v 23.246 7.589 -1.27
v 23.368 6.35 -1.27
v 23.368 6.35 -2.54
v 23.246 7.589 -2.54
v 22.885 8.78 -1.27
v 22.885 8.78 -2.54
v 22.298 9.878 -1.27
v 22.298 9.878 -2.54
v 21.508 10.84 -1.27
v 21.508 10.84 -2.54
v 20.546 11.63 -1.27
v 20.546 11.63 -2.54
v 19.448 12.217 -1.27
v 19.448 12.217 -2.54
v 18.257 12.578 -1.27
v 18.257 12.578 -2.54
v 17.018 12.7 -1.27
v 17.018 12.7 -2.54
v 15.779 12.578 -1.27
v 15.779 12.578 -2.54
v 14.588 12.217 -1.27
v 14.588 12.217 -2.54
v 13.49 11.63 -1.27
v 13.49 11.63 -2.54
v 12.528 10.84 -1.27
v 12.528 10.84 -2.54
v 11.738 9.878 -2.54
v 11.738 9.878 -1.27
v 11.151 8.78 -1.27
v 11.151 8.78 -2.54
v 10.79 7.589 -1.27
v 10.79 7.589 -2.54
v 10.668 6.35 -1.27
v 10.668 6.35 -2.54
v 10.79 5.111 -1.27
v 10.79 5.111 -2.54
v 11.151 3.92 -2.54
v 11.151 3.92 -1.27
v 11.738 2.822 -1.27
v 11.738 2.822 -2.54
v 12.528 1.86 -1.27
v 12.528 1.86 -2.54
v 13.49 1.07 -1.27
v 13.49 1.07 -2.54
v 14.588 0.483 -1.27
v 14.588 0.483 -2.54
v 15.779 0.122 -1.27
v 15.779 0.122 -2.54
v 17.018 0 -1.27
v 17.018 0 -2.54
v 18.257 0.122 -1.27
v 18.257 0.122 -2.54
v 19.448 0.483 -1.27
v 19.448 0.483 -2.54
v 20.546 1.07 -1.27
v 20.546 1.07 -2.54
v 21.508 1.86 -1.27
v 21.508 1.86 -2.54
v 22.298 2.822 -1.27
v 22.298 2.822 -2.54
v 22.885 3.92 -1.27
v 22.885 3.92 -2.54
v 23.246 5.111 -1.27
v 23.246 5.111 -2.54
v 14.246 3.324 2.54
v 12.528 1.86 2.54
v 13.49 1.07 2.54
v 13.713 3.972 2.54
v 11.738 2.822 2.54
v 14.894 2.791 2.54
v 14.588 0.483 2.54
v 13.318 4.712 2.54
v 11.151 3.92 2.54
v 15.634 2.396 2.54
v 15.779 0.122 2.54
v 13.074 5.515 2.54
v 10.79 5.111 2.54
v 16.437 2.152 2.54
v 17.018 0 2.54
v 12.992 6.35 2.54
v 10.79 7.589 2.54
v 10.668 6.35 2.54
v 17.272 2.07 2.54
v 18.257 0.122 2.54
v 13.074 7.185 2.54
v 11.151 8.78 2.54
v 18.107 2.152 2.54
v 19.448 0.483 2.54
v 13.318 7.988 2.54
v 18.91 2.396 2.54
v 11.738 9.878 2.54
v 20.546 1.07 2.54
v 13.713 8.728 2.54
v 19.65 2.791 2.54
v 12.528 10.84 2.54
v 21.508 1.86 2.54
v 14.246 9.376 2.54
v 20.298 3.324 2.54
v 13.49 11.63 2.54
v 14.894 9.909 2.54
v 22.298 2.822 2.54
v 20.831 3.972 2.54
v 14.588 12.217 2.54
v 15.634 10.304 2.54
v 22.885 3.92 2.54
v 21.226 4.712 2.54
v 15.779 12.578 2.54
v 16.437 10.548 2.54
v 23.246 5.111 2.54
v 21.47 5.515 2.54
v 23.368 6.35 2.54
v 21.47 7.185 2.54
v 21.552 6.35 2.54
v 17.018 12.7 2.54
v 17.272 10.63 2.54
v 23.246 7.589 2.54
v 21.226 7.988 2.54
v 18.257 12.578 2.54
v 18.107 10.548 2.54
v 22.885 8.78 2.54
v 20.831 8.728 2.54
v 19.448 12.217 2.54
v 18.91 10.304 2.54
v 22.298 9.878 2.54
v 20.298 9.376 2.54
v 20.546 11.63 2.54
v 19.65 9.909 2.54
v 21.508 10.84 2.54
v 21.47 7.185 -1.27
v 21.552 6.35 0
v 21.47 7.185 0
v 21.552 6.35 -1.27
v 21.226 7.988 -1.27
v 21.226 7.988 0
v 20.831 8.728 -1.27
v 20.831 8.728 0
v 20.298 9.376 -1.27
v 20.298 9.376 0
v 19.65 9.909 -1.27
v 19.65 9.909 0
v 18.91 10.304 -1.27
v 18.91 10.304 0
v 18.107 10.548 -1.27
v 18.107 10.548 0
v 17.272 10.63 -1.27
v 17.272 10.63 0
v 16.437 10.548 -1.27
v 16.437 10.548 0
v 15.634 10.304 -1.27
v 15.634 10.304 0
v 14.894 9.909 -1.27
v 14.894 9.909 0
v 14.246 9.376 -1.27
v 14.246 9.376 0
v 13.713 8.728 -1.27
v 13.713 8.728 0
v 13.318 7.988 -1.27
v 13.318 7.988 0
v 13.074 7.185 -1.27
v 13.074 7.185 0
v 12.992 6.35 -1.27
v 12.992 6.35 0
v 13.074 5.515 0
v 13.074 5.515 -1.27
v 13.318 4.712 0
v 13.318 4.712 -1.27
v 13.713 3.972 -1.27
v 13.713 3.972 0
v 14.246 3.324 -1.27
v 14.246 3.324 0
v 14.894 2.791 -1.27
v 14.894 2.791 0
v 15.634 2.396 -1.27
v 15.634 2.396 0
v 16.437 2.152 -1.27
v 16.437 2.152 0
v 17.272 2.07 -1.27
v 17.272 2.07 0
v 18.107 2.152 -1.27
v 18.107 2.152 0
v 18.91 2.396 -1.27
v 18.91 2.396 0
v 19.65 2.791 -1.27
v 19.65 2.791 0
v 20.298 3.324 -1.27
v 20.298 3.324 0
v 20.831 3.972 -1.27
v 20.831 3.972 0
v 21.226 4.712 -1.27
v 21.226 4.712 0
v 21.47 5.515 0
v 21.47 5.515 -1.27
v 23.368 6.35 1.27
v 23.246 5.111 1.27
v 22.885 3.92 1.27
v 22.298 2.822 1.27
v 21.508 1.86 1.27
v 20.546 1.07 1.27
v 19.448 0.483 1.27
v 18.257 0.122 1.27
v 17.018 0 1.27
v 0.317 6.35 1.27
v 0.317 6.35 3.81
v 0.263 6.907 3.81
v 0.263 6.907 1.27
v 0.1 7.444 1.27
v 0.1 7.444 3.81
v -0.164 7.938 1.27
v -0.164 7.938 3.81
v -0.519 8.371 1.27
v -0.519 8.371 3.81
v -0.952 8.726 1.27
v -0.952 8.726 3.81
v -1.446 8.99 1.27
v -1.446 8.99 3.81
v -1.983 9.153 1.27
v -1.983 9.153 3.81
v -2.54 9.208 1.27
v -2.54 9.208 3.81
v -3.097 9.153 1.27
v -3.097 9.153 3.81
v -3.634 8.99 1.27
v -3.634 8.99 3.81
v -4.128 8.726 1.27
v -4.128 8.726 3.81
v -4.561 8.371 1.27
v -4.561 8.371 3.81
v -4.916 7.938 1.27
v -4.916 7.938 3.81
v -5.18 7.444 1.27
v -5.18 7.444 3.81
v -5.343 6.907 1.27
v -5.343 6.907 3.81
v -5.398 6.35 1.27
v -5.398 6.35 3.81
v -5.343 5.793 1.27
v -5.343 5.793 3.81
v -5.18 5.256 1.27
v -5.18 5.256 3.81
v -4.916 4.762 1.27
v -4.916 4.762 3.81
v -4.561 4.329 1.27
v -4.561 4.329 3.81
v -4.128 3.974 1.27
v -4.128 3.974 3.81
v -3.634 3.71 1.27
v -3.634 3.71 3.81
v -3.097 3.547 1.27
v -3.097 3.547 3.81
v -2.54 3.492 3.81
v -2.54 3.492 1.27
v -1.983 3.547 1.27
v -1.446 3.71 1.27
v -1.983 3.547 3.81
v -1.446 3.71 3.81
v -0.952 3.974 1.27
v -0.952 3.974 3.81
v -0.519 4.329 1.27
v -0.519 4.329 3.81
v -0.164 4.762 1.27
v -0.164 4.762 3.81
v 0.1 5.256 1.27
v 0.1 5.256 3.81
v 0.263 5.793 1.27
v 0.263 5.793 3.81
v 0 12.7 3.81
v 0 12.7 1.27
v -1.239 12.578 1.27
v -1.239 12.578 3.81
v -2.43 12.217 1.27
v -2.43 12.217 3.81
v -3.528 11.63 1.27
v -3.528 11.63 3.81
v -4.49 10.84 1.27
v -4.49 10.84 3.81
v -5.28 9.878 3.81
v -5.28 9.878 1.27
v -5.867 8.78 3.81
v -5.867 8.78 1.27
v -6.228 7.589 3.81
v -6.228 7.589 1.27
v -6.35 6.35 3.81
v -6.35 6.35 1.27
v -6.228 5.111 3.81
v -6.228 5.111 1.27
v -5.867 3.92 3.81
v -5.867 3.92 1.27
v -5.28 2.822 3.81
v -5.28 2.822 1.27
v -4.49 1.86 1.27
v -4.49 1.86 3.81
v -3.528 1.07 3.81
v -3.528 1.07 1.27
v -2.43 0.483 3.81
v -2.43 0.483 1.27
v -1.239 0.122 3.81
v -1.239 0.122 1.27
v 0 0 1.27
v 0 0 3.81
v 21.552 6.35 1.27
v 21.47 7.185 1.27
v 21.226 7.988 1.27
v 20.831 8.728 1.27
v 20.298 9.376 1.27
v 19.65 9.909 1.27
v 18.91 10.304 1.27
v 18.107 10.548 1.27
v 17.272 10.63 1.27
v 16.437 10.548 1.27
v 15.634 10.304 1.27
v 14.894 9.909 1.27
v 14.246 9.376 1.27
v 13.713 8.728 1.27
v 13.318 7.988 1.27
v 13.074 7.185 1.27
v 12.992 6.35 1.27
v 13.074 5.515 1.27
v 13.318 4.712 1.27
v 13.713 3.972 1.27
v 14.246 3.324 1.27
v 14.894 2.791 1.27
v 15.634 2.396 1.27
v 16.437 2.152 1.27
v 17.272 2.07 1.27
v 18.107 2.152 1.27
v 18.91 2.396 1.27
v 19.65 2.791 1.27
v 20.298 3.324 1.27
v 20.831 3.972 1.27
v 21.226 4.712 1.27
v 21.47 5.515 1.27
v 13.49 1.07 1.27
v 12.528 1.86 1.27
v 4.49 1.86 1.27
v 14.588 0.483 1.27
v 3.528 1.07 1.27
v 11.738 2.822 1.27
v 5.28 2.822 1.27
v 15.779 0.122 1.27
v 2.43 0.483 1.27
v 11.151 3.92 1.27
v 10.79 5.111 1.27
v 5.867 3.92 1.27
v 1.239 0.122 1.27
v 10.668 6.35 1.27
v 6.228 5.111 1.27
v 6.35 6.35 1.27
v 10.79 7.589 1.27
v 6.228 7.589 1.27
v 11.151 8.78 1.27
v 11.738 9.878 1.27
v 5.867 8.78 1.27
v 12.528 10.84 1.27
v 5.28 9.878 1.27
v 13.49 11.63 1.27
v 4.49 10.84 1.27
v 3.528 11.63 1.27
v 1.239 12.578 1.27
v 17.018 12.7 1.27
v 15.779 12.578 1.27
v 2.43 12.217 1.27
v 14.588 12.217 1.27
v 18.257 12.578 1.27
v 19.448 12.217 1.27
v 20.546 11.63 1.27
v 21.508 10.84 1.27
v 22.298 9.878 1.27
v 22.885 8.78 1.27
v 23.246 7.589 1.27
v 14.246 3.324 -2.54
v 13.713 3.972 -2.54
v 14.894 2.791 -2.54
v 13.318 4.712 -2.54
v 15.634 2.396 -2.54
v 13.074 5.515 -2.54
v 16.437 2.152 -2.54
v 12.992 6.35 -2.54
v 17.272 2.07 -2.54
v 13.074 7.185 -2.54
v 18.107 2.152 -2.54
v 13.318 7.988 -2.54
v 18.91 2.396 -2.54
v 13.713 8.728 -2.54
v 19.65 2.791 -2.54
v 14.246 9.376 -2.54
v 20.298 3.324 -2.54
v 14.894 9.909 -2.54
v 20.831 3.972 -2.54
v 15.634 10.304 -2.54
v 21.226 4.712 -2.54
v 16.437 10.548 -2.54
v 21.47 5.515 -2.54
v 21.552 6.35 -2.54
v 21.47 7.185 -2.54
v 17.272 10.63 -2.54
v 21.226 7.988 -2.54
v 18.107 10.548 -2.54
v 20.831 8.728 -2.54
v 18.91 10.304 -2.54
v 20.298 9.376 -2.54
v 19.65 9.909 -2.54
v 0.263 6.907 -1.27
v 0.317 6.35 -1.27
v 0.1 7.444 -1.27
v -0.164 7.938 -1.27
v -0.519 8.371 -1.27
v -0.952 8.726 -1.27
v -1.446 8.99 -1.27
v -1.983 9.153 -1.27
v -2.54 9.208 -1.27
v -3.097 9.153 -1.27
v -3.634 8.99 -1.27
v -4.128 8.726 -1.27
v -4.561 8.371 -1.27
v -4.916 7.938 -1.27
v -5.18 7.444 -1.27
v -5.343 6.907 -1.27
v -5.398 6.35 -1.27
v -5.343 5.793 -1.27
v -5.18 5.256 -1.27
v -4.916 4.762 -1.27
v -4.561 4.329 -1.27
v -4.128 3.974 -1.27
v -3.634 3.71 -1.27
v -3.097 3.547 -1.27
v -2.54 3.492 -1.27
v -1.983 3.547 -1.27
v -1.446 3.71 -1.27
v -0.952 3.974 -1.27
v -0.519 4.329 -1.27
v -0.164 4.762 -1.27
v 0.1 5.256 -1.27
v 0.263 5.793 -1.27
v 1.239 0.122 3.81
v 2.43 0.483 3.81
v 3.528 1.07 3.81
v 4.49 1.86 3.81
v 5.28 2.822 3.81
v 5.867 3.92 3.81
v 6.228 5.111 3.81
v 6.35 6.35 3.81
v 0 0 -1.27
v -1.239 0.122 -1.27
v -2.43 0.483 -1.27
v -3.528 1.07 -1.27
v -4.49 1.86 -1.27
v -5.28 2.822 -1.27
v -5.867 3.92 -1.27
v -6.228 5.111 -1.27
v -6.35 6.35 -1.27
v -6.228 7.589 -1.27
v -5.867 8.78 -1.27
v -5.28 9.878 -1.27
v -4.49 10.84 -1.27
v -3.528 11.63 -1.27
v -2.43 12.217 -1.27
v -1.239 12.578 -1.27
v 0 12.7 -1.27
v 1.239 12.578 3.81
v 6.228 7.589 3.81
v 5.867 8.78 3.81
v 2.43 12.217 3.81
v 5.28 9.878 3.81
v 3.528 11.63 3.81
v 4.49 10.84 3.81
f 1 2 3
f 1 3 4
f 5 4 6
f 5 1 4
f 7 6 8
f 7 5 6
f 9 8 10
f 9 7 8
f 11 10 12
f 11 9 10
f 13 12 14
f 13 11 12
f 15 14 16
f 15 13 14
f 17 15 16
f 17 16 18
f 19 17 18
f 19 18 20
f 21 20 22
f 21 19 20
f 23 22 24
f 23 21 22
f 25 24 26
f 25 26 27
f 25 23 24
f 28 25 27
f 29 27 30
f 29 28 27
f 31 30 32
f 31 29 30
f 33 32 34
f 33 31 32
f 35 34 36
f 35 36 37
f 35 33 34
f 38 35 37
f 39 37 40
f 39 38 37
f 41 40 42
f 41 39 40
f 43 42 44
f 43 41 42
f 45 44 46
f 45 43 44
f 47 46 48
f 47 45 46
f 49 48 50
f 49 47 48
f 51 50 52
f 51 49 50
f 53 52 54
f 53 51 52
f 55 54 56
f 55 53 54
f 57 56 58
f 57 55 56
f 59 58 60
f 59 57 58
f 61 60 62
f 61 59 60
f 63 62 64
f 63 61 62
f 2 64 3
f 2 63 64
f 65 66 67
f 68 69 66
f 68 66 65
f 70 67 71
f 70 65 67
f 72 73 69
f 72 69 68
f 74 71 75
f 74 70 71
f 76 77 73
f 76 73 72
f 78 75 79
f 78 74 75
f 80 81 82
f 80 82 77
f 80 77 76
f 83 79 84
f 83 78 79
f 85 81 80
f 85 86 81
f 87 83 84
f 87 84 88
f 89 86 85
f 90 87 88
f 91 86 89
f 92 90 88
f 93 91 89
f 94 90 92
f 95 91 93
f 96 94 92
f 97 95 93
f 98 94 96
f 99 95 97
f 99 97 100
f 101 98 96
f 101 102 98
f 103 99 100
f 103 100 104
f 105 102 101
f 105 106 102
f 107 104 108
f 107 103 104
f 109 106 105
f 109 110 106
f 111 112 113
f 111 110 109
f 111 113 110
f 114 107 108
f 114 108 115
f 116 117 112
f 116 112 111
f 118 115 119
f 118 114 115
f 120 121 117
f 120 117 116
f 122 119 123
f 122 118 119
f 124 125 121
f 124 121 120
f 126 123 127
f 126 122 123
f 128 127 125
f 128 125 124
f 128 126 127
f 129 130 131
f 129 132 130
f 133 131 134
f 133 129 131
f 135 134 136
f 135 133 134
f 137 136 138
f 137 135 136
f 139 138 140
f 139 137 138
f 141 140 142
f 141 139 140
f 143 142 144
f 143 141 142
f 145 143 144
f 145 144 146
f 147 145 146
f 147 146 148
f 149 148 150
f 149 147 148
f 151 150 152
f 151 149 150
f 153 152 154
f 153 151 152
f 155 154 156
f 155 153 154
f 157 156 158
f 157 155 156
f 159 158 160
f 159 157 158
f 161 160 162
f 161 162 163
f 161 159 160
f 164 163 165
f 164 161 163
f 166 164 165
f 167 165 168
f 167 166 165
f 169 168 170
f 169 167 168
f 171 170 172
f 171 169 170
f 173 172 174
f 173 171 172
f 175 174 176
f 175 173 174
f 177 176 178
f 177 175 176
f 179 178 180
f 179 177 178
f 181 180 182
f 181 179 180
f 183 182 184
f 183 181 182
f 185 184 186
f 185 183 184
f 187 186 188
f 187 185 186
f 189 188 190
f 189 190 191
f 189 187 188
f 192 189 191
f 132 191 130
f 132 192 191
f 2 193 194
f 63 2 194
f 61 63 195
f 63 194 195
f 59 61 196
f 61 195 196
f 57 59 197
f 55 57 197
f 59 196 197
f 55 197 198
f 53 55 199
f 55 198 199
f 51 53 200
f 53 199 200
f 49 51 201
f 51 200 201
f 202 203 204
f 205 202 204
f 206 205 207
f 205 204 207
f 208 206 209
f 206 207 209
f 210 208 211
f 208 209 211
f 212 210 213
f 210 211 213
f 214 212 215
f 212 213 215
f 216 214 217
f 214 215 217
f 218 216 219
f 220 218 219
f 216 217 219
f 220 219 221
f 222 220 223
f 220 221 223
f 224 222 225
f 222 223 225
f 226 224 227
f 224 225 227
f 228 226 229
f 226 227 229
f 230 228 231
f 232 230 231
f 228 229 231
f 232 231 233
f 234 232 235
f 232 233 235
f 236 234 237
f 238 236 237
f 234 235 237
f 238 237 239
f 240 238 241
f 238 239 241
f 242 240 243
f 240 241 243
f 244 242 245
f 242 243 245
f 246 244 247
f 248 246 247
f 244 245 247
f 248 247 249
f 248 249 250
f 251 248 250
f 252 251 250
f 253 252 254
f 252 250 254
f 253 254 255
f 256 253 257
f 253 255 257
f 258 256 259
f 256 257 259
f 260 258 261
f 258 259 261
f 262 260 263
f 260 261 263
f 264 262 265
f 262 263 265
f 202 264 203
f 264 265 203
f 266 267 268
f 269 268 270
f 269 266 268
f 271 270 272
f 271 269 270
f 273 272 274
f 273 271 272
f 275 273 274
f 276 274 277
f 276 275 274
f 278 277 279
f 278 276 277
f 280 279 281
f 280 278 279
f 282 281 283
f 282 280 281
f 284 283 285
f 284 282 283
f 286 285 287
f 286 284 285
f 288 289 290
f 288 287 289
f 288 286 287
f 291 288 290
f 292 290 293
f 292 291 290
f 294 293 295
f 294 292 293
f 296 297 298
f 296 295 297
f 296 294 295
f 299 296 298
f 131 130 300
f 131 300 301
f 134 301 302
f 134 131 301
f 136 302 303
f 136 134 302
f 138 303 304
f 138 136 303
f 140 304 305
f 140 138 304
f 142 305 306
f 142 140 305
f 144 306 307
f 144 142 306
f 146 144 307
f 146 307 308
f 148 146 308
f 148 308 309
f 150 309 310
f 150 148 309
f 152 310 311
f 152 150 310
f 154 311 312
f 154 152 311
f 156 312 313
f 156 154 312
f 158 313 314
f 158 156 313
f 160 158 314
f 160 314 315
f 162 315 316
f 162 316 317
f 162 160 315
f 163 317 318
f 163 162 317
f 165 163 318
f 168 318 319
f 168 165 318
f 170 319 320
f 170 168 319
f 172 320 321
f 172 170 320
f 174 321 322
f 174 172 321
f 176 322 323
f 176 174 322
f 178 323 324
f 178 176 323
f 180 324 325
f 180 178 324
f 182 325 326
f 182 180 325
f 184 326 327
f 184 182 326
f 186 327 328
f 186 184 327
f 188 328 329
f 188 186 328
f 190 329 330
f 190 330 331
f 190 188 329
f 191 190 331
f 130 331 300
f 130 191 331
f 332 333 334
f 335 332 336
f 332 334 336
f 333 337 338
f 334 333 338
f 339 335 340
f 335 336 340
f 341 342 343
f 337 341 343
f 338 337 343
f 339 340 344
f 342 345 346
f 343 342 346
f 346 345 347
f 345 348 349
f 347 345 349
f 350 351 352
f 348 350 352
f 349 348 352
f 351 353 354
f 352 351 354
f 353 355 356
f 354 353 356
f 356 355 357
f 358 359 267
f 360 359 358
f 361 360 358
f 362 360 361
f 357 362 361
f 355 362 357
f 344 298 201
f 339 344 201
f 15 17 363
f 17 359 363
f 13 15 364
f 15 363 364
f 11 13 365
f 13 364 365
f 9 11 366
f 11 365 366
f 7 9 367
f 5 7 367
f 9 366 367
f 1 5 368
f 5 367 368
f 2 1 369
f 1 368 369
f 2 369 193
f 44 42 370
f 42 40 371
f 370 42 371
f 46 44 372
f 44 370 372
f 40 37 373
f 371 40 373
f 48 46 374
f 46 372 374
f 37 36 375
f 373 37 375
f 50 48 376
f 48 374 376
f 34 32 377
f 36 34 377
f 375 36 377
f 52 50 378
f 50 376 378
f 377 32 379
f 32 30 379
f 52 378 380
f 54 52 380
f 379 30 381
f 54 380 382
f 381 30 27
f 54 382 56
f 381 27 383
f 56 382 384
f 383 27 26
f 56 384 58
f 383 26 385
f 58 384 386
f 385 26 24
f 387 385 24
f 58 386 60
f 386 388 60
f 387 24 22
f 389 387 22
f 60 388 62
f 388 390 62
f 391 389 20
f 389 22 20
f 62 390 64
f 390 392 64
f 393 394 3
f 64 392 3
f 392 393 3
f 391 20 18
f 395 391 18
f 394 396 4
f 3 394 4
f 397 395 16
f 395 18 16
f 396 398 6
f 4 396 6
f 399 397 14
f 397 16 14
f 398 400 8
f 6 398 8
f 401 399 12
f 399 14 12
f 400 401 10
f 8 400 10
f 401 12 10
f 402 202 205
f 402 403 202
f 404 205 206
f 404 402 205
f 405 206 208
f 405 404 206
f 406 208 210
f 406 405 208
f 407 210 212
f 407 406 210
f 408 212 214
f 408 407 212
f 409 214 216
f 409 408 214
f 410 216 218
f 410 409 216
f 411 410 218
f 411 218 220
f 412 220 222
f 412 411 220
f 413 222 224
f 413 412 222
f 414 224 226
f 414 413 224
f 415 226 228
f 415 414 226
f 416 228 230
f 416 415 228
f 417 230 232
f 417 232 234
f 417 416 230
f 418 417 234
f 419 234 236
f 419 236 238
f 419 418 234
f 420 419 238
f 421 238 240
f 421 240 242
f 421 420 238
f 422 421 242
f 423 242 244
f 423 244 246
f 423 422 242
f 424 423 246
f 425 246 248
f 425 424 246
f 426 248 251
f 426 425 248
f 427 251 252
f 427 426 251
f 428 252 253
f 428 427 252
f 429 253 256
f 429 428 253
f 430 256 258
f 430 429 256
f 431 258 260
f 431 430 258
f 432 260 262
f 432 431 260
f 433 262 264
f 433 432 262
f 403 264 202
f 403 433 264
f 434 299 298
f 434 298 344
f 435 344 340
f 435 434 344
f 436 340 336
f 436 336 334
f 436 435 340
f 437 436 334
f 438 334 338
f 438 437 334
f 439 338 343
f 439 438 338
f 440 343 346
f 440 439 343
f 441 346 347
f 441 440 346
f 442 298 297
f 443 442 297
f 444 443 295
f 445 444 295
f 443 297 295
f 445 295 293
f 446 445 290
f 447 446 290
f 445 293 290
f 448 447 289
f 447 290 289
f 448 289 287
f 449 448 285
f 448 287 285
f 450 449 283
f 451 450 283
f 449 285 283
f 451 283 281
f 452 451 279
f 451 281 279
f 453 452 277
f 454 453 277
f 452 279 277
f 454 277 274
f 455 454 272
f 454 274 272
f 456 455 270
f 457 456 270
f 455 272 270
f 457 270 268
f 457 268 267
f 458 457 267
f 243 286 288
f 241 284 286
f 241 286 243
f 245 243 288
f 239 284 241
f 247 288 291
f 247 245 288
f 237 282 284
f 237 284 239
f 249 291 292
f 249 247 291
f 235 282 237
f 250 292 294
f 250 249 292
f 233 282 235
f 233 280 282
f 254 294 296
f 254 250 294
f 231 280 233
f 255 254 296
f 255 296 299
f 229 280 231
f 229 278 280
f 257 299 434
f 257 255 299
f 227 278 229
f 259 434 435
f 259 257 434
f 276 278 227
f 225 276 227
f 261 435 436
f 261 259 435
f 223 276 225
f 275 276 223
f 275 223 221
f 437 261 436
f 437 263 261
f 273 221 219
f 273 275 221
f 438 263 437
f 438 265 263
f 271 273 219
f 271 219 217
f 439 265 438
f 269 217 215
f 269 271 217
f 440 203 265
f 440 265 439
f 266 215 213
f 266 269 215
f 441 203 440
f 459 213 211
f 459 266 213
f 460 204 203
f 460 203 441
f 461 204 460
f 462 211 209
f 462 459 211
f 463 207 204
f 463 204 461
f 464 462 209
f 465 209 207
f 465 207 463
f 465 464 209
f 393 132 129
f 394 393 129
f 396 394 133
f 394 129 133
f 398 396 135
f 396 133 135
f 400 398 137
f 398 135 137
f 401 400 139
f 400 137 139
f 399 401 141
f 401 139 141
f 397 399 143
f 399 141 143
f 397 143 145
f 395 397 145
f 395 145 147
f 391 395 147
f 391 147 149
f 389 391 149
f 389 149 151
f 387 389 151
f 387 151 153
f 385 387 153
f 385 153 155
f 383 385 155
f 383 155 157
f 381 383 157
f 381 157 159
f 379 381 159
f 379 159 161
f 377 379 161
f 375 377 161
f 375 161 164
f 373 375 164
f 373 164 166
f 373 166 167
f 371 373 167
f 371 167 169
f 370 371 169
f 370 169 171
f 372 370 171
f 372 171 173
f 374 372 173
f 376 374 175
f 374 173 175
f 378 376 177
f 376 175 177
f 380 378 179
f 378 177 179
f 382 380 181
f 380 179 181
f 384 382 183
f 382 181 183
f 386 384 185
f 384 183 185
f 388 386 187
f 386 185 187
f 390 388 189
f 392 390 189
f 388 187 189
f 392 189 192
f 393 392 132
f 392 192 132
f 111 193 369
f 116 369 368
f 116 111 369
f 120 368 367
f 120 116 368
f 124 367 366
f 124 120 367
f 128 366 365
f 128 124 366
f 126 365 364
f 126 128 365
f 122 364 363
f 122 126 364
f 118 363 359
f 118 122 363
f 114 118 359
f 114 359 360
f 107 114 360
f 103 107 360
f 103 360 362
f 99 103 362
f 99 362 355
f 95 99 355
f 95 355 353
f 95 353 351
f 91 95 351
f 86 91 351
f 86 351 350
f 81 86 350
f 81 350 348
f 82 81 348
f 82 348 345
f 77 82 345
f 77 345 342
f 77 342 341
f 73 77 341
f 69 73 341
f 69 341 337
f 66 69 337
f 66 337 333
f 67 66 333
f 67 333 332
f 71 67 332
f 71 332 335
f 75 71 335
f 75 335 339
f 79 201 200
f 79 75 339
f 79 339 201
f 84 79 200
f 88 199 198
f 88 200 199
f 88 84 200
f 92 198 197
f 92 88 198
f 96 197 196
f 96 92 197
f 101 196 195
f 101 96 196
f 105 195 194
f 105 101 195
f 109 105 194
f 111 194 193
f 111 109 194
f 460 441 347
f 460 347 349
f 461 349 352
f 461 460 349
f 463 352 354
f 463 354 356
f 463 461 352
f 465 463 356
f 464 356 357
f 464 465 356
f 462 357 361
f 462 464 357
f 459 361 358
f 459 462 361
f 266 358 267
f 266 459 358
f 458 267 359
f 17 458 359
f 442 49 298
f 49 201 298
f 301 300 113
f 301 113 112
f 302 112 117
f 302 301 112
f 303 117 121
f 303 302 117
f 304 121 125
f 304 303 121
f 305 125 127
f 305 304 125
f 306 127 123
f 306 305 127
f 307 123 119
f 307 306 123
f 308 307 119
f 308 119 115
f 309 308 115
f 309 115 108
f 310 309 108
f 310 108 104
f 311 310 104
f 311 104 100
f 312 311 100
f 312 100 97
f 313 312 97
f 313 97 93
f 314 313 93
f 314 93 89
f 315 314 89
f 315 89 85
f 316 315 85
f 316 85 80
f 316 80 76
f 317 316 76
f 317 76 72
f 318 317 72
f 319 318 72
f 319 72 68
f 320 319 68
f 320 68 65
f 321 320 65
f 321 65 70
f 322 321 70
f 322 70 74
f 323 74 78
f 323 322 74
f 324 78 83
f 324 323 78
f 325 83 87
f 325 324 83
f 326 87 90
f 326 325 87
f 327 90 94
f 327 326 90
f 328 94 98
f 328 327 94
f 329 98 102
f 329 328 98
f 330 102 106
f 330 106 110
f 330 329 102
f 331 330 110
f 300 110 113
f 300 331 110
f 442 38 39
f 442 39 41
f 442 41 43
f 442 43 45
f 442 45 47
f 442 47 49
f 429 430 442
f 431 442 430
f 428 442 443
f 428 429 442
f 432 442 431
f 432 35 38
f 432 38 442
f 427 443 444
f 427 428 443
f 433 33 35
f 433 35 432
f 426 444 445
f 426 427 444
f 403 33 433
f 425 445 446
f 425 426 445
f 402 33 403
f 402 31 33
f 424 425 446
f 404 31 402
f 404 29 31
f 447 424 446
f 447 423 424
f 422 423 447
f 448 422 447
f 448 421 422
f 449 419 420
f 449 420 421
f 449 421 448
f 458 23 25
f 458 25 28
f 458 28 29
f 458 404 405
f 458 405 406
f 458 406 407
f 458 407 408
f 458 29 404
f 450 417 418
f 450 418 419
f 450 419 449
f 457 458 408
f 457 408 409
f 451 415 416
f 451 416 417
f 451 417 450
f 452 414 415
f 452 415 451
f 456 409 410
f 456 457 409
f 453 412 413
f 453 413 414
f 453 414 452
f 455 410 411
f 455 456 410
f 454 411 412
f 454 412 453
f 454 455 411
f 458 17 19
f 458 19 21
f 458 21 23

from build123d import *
from build123d.topology import SkipClean

# Parameters (mm, degrees)
SKETCH1_R           = 2.8575
SKETCH1_R_2         = 4.2799
BOSS_EXTRUDE1_DEPTH = 1.27
BOSS_EXTRUDE2_START = 2.54
SKETCH2_R           = 2.8575
BOSS_EXTRUDE2_DEPTH = 2.54
SKETCH4_R           = 6.35
SKETCH4_R_2         = 4.2799
BOSS_EXTRUDE4_DEPTH = 2.54


with BuildPart() as part:
    # Sketch1 → Boss-Extrude1 (new, symmetric)
    with BuildSketch(Plane.XY):
        with BuildLine():
            Line((0, 12.7), (17.018, 12.7))
            ThreePointArc((17.018, 12.7), (23.368, 6.35), (17.018, 0))
            Line((17.018, 0), (0, 0))
            ThreePointArc((0, 0), (-6.35, 6.35), (0, 12.7))
        make_face()
        with Locations((-2.54, 6.35)):
            Circle(SKETCH1_R, mode=Mode.SUBTRACT)
        with Locations((17.272, 6.35)):
            Circle(SKETCH1_R_2, mode=Mode.SUBTRACT)
    extrude(amount=BOSS_EXTRUDE1_DEPTH, both=True)

    # Sketch2 → Boss-Extrude2 (add)
    with SkipClean():  # the faces are left unmerged after this step: merging them gives an invalid solid
        with BuildSketch(Plane.XY.offset(1.27).offset(BOSS_EXTRUDE2_START)):
            with BuildLine():
                ThreePointArc((0, 0), (4.490128061, 1.859871939), (6.35, 6.35))
                ThreePointArc((6.35, 6.35), (4.490128061, 10.840128061), (0, 12.7))
                ThreePointArc((0, 12.7), (-6.35, 6.35), (0, 0))
            make_face()
            with Locations((-2.54, 6.35)):
                Circle(SKETCH2_R, mode=Mode.SUBTRACT)
        extrude(amount=-BOSS_EXTRUDE2_DEPTH)

    # Sketch4 → Boss-Extrude4 (add, symmetric)
    with SkipClean():  # the faces are left unmerged after this step: merging them gives an invalid solid
        with BuildSketch(Plane.XY):
            with Locations((17.018, 6.35)):
                Circle(SKETCH4_R)
            with Locations((17.272, 6.35)):
                Circle(SKETCH4_R_2, mode=Mode.SUBTRACT)
        extrude(amount=BOSS_EXTRUDE4_DEPTH, both=True)


solid = part.part
